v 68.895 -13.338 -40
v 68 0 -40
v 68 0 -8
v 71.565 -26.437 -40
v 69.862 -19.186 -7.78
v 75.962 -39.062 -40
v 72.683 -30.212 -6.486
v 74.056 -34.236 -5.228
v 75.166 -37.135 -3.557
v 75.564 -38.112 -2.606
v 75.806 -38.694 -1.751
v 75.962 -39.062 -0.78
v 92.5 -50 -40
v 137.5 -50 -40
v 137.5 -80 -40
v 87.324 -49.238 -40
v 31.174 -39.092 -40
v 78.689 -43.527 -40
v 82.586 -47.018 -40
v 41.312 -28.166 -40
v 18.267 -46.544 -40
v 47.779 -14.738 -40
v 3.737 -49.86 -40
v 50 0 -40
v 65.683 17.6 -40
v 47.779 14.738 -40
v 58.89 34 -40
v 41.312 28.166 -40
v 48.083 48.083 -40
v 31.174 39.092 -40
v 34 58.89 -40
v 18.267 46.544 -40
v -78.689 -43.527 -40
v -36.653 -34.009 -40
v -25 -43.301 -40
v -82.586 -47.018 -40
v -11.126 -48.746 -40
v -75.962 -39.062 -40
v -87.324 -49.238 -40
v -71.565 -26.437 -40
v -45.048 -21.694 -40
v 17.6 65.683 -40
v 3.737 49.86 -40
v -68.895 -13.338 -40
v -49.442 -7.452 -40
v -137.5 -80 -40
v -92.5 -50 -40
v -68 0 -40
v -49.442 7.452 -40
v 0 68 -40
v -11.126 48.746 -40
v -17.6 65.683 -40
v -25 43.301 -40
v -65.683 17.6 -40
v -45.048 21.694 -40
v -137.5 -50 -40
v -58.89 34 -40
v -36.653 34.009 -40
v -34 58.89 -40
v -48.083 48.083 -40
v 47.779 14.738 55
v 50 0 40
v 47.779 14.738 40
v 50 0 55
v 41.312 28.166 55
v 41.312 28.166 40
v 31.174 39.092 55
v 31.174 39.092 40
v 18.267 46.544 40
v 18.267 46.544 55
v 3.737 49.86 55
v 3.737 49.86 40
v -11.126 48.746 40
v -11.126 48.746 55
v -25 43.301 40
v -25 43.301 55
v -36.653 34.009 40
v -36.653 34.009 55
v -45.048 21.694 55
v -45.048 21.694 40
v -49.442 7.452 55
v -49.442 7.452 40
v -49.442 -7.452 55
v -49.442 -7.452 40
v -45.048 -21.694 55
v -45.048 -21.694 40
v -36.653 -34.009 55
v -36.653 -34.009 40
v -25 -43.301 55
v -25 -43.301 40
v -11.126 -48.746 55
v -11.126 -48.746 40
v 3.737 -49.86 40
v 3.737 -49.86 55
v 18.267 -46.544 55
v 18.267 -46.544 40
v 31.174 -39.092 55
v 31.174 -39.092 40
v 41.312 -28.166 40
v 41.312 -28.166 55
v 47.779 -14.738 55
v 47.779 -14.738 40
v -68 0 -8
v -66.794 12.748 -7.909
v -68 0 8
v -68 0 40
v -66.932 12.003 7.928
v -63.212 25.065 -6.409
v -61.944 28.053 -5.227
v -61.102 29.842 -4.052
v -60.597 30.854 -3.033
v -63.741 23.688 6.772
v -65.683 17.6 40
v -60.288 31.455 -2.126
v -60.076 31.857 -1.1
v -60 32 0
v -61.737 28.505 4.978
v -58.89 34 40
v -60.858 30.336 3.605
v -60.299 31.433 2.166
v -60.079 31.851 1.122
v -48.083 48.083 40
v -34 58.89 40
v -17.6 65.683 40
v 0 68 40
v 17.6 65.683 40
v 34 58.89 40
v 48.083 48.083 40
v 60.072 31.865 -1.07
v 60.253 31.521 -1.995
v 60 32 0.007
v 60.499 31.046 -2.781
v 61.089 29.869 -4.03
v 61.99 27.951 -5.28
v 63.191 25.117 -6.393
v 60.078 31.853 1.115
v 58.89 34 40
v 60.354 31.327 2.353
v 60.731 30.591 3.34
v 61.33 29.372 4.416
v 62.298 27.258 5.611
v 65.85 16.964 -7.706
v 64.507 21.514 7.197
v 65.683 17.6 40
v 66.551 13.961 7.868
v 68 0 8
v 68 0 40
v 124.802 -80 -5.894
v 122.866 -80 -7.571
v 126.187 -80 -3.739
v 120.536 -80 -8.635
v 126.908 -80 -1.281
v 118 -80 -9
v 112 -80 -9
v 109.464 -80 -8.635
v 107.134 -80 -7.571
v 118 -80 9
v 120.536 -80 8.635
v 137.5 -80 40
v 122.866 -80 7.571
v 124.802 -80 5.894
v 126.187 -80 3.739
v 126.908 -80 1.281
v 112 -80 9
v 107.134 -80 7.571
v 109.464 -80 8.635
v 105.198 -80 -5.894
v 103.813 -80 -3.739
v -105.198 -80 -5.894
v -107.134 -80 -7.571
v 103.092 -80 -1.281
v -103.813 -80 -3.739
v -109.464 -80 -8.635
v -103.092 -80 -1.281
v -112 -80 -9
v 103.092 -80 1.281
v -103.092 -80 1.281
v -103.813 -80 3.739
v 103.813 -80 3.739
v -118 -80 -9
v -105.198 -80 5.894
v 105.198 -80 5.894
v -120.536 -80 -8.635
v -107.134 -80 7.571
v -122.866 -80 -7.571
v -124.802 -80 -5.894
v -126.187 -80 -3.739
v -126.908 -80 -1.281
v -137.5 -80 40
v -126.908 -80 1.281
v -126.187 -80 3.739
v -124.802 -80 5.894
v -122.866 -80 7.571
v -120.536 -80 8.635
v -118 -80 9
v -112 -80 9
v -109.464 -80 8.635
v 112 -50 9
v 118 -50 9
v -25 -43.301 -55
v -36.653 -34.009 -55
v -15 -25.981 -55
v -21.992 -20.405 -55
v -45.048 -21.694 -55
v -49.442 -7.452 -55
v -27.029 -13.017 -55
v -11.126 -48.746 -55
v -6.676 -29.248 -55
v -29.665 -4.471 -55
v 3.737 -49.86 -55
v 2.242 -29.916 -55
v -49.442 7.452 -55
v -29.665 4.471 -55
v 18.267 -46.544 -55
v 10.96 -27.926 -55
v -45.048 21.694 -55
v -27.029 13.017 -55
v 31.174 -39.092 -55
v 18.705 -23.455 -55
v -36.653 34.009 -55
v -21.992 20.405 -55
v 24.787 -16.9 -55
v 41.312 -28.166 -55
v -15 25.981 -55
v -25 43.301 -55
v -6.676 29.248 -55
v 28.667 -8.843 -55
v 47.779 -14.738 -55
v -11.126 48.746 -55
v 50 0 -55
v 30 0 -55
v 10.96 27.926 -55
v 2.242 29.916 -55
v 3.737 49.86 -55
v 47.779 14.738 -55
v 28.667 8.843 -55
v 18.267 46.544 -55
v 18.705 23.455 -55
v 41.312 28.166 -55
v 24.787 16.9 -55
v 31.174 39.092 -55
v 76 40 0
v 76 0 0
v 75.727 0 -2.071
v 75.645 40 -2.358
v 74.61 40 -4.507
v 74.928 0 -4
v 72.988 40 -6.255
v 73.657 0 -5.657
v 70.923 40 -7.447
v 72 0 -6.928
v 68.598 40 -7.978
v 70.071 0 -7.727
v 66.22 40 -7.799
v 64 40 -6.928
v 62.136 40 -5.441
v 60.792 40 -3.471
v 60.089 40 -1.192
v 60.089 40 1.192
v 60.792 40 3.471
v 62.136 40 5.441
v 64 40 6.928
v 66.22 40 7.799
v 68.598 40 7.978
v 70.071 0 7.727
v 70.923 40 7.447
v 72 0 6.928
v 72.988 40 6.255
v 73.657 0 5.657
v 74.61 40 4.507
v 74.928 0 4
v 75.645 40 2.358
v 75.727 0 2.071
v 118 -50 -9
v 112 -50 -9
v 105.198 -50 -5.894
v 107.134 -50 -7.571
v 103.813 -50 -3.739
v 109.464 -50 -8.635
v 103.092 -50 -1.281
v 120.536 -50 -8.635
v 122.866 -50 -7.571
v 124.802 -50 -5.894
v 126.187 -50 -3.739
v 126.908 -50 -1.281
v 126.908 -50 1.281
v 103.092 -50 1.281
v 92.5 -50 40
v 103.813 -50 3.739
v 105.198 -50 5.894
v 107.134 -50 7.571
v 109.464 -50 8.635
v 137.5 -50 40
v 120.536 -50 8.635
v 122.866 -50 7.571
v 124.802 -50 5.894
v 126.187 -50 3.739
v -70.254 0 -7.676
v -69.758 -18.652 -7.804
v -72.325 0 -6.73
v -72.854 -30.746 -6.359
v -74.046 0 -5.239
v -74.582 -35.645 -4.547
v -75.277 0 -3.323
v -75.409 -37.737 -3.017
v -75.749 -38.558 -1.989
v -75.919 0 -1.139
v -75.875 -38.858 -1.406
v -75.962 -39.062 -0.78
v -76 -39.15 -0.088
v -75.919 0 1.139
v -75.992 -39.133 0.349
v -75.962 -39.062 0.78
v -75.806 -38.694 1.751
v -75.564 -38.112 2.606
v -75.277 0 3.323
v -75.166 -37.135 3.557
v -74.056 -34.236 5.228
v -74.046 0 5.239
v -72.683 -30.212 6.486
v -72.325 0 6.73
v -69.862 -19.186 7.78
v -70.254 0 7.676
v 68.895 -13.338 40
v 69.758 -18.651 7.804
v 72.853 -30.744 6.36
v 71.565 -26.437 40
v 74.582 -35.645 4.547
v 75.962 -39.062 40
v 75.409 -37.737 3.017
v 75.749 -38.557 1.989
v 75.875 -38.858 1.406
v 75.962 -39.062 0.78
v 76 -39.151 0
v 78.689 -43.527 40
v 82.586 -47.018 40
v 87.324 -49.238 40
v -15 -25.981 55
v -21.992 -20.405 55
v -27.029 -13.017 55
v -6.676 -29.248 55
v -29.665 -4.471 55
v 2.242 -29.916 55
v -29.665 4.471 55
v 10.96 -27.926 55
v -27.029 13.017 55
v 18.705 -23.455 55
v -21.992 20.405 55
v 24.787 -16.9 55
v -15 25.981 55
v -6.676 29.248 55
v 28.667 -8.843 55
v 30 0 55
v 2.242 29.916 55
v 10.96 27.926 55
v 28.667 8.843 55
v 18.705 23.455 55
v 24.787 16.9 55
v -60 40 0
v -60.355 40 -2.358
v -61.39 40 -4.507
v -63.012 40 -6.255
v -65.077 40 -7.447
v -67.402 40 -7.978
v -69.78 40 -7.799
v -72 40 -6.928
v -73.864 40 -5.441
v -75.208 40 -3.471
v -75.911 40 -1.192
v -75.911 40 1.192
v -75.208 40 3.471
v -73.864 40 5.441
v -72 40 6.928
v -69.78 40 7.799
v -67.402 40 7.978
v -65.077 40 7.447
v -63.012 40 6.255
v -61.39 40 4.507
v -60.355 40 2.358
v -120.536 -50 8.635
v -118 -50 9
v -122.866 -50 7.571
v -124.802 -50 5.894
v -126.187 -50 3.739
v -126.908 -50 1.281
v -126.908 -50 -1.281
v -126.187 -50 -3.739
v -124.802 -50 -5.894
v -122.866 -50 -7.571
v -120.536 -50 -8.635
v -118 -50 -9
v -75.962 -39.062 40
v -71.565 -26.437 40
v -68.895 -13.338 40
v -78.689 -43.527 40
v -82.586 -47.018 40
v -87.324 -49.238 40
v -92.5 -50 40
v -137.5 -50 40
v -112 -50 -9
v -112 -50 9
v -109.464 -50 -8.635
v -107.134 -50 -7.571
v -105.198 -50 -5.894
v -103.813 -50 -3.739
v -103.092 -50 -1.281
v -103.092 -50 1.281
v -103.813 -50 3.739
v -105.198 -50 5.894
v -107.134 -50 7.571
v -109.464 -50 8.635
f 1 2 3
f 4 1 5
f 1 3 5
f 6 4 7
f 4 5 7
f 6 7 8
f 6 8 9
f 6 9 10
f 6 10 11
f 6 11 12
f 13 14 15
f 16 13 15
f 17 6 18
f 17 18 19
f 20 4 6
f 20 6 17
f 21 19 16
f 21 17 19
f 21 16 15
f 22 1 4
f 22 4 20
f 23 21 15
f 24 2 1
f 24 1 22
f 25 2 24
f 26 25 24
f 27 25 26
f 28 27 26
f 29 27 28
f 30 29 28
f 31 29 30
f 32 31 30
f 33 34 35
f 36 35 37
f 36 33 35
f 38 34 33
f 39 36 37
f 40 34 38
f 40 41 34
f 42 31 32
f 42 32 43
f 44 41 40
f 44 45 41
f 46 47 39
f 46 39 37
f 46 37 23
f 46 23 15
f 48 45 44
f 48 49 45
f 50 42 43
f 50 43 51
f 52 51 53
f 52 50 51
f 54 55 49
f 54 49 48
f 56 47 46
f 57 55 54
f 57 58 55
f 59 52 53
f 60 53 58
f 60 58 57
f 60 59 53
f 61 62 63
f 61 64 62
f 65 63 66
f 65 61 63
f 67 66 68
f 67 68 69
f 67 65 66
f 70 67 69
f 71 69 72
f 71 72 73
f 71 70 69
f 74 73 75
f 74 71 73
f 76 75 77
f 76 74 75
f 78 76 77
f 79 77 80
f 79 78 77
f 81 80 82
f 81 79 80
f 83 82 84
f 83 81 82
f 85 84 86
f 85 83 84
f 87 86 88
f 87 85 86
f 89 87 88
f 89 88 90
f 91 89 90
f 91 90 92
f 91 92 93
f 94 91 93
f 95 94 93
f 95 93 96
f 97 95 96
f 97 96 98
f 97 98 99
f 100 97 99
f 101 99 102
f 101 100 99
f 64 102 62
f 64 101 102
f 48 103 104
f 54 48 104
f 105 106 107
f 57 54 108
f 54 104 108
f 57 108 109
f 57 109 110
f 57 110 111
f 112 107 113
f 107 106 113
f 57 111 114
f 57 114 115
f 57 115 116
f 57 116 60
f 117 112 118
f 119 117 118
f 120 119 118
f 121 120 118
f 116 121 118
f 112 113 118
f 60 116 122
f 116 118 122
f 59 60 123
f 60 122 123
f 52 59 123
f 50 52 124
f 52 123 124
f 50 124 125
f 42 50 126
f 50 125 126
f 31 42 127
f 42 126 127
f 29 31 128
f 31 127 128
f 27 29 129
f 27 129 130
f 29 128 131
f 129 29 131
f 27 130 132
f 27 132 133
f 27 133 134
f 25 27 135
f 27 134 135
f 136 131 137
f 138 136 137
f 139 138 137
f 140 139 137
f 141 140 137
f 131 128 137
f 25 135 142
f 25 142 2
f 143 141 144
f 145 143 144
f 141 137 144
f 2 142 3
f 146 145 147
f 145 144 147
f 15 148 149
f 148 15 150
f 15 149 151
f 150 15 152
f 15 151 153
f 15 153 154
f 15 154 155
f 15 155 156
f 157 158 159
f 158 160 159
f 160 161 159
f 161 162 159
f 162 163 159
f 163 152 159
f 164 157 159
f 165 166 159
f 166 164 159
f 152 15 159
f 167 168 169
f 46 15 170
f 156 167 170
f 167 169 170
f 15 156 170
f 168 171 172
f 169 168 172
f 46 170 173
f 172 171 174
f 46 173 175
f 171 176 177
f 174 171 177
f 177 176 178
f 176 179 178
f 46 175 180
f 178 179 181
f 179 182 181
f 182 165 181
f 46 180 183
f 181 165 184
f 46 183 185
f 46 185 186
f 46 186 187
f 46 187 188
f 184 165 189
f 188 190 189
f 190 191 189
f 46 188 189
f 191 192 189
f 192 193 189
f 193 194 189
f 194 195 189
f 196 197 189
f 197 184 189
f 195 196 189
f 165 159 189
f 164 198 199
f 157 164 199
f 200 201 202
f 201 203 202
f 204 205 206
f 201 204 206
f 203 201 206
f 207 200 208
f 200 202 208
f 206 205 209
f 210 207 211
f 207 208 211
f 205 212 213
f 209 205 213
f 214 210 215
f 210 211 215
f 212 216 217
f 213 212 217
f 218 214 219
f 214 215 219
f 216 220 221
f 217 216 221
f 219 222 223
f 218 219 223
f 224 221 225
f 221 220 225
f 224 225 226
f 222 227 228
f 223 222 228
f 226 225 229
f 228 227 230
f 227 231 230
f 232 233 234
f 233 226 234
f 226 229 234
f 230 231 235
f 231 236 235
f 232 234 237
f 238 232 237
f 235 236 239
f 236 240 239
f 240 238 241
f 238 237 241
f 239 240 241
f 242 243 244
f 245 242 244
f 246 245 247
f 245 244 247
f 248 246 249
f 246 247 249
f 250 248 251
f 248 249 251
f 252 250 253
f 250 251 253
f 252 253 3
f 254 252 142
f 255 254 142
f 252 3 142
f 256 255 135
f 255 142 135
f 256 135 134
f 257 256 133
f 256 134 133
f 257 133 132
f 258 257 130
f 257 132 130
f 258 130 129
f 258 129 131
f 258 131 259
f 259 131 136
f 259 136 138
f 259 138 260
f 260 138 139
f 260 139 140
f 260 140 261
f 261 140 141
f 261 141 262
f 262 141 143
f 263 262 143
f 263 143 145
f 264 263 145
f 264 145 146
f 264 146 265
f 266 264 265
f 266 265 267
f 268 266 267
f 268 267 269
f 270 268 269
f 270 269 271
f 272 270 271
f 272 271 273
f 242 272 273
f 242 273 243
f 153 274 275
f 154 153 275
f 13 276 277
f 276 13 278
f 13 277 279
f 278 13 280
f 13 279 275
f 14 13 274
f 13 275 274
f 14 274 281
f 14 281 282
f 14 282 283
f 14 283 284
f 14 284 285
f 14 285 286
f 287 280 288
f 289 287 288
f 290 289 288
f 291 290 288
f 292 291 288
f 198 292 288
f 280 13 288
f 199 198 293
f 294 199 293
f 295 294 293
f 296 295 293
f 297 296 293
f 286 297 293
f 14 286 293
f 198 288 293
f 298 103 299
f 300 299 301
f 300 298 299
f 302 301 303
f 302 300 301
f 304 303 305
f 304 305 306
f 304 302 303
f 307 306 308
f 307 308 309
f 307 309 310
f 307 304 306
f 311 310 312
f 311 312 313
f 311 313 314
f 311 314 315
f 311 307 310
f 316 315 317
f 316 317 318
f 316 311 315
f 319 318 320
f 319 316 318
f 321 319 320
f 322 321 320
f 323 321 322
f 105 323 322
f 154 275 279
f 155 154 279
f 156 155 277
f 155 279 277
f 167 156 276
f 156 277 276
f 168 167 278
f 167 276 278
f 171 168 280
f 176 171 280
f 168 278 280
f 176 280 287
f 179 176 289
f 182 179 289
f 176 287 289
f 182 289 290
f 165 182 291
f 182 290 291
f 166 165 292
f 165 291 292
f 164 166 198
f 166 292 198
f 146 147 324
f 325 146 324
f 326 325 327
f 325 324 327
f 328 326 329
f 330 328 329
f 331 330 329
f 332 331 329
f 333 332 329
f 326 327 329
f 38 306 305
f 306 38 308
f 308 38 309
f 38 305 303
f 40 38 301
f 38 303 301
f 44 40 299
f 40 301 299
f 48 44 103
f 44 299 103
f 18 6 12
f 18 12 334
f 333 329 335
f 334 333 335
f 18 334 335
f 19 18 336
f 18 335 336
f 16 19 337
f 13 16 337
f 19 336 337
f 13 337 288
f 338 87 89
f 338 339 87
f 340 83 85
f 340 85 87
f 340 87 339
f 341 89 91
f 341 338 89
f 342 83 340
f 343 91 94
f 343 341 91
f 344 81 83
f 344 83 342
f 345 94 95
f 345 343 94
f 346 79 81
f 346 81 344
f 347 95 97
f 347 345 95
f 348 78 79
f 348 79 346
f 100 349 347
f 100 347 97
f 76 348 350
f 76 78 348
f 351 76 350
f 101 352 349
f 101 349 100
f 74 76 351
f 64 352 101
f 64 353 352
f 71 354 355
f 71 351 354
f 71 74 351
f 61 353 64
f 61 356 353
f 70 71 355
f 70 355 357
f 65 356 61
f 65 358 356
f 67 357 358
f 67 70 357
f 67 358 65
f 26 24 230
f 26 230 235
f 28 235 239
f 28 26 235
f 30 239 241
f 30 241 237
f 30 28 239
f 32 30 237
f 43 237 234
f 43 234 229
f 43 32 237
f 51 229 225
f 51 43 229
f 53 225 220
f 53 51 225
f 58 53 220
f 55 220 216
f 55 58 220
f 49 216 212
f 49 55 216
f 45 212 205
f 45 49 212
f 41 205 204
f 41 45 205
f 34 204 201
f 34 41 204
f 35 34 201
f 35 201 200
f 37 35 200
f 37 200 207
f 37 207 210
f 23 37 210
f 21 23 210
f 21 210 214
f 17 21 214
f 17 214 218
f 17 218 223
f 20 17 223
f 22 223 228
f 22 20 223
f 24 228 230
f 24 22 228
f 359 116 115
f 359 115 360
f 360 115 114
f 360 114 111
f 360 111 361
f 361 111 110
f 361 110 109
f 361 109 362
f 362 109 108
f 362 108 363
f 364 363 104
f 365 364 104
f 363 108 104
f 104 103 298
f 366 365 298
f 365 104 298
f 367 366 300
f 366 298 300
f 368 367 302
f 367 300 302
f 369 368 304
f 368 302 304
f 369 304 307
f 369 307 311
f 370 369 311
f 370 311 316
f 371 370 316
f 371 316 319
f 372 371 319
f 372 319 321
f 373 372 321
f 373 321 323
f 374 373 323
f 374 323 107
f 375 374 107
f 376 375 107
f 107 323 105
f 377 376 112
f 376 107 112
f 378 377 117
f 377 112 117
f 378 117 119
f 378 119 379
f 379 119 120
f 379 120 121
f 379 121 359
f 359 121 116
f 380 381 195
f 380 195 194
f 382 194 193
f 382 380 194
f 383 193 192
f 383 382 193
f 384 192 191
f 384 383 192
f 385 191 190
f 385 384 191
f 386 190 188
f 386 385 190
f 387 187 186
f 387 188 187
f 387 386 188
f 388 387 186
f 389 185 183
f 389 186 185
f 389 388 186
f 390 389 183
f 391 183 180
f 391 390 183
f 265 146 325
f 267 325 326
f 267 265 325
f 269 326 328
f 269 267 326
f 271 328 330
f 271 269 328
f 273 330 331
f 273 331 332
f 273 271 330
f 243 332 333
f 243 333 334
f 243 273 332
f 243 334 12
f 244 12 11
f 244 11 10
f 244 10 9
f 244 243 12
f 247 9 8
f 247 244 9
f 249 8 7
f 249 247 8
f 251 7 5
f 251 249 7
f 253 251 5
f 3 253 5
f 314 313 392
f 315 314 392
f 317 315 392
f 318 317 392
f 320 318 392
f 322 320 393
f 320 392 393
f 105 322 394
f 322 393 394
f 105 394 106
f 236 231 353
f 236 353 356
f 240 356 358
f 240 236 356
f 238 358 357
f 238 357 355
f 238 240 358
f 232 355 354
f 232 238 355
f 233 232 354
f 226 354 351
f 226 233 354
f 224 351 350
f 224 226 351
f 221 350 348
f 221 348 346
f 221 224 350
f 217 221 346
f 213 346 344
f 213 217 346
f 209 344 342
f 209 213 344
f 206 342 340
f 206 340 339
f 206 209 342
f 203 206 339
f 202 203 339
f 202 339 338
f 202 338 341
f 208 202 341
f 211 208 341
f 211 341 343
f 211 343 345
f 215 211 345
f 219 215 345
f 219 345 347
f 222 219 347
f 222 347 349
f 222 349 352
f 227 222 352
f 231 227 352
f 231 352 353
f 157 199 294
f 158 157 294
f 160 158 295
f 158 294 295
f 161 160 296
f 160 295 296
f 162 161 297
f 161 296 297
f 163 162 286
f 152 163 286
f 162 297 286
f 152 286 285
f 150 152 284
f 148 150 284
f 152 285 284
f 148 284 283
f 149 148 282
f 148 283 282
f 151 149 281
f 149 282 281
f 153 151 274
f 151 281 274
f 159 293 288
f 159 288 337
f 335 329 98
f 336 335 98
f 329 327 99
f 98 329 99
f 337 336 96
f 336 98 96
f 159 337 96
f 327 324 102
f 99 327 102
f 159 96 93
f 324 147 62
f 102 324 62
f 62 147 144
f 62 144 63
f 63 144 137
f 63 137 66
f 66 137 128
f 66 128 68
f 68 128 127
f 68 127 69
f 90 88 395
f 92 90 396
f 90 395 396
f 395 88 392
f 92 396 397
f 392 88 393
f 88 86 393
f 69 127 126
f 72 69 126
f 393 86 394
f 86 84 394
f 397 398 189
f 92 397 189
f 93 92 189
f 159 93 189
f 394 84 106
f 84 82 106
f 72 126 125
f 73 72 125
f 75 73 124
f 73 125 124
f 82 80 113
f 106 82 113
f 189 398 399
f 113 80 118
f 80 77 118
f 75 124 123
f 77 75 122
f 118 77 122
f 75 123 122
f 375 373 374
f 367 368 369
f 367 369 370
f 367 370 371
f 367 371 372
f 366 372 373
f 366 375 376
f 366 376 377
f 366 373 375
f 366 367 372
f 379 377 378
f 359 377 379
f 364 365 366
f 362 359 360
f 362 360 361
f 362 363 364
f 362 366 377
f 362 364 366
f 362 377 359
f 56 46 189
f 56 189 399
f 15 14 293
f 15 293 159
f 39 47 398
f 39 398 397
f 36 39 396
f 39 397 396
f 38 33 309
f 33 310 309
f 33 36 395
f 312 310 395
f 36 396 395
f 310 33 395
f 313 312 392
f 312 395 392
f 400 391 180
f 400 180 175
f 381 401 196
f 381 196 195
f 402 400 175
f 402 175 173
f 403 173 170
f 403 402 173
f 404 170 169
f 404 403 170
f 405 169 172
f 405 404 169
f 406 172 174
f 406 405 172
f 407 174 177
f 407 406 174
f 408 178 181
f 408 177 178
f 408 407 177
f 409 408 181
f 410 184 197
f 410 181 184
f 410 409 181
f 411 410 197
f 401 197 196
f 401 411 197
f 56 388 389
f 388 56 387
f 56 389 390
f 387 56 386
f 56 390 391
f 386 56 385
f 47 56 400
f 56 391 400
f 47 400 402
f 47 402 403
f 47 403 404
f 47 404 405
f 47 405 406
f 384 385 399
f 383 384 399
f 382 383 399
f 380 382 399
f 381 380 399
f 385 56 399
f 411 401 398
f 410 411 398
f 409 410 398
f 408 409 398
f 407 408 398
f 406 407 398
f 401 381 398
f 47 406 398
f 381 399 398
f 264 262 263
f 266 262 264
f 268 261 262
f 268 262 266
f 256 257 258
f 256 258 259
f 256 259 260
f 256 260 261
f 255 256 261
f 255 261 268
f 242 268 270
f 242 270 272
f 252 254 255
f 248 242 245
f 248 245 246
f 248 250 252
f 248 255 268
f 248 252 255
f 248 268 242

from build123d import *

# Parameters (mm, degrees)
SKETCH1_R                = 30
BOSS_EXTRUDE1_DEPTH      = 40
SKETCH2_R                = 50
SKETCH2_R_2              = 30
BOSS_EXTRUDE2_DEPTH      = 55
CUT_EXTRUDE1_DEPTH       = 110
SKETCH5_R                = 8
BOSS_EXTRUDE3_DEPTH      = 40
BOSS_EXTRUDE3_DEPTH_BACK = 60


with BuildPart() as part:
    # Sketch1 → Boss-Extrude1 (new body, symmetric)
    with BuildSketch(Plane.XY):
        with BuildLine():
            Line((137.5, -80), (-137.5, -80))
            Line((-137.5, -80), (-137.5, -50))
            Line((-137.5, -50), (-92.5, -50))
            ThreePointArc((-92.5, -50), (-82.586036695, -47.018171653), (-75.961854895, -39.062156056))
            ThreePointArc((-75.961854895, -39.062156056), (-70.010718453, -19.932656428), (-68, 0))
            ThreePointArc((-68, 0), (0, 68), (68, 0))
            ThreePointArc((68, 0), (70.010718453, -19.932656428), (75.961854895, -39.062156056))
            ThreePointArc((75.961854895, -39.062156056), (82.586036695, -47.018171653), (92.5, -50))
            Line((92.5, -50), (137.5, -50))
            Line((137.5, -50), (137.5, -80))
        make_face()
        Circle(SKETCH1_R, mode=Mode.SUBTRACT)
    extrude(amount=BOSS_EXTRUDE1_DEPTH, both=True)

    # Sketch2 → Boss-Extrude2 (add, symmetric)
    with BuildSketch(Plane.XY):
        Circle(SKETCH2_R)
        Circle(SKETCH2_R_2, mode=Mode.SUBTRACT)
    extrude(amount=BOSS_EXTRUDE2_DEPTH, both=True)

    # Sketch3 → Cut-Extrude1 (cut)
    with BuildSketch(Plane(origin=(0, 0, 0), x_dir=(1, 0, 0), z_dir=(0, 1, 0))):
        with BuildLine():
            Line((-118, 9), (-112, 9))
            ThreePointArc((-112, 9), (-103, 0), (-112, -9))
            Line((-112, -9), (-118, -9))
            ThreePointArc((-118, -9), (-127, 0), (-118, 9))
        make_face()
        with BuildLine():
            Line((118, 9), (112, 9))
            ThreePointArc((112, 9), (103, 0), (112, -9))
            Line((112, -9), (118, -9))
            ThreePointArc((118, -9), (127, 0), (118, 9))
        make_face()
    extrude(amount=-CUT_EXTRUDE1_DEPTH, mode=Mode.SUBTRACT)

    # Sketch5 → Boss-Extrude3 (add, two sides)
    with BuildSketch(Plane(origin=(0, 0, 0), x_dir=(1, 0, 0), z_dir=(0, 1, 0))) as boss_extrude3_sk:
        with Locations((-68, 0)):
            Circle(SKETCH5_R)
        with Locations((68, 0)):
            Circle(SKETCH5_R)
    extrude(amount=BOSS_EXTRUDE3_DEPTH)
    extrude(boss_extrude3_sk.sketch, amount=-BOSS_EXTRUDE3_DEPTH_BACK)


solid = part.part
